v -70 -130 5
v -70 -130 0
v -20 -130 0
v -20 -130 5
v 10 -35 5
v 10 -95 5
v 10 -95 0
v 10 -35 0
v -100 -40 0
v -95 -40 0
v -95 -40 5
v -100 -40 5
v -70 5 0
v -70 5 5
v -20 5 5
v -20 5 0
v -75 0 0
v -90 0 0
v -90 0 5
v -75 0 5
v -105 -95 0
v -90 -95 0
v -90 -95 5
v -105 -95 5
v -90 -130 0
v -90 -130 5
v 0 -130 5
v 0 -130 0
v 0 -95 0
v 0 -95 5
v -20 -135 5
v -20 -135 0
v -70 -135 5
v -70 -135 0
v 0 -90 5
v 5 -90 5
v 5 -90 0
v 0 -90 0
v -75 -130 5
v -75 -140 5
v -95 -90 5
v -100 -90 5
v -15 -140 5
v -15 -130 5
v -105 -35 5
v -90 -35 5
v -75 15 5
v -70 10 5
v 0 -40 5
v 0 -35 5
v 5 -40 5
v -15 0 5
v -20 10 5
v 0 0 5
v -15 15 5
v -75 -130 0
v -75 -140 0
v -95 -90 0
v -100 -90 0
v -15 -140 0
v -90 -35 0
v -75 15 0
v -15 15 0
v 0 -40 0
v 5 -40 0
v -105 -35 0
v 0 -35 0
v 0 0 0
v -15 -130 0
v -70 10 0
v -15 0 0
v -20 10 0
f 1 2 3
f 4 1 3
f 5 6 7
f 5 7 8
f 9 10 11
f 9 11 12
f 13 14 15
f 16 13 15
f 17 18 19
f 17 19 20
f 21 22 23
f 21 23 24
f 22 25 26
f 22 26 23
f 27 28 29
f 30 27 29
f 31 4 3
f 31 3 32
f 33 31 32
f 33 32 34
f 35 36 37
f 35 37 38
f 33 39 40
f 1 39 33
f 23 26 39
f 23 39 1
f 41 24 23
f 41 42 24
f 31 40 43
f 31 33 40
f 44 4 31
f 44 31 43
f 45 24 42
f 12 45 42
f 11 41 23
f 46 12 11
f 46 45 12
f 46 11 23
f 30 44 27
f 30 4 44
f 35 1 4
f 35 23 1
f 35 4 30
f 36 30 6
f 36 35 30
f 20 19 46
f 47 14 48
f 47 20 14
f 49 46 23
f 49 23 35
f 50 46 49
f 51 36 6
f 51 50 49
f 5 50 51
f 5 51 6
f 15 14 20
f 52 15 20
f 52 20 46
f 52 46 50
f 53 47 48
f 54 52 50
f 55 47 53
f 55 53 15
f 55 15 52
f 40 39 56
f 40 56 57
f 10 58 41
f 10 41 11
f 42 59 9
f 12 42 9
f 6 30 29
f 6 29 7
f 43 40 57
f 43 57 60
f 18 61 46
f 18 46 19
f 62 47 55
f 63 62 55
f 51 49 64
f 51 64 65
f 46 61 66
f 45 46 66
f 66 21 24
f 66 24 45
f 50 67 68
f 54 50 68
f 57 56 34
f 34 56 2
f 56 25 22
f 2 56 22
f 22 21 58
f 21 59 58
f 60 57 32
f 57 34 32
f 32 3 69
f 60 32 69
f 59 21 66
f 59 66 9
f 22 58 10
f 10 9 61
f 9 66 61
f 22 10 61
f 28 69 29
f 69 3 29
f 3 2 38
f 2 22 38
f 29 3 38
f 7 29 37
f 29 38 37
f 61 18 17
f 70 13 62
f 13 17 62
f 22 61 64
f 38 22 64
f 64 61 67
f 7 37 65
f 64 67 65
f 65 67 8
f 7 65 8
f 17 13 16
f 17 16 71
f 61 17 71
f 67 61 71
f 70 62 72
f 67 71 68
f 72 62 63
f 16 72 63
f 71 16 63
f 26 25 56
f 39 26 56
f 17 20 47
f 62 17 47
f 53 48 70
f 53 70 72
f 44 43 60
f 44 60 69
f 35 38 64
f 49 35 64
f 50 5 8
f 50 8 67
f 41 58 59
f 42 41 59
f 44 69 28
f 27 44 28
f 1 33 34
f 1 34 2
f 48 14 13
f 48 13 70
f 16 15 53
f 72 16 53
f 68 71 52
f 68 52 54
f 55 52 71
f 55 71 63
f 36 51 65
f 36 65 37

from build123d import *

# Parameters (mm, degrees)
SKETCH1_W           = 90
SKETCH1_H           = 130
BOSS_EXTRUDE1_DEPTH = 5
SKETCH2_W           = 60
SKETCH2_H           = 15
SKETCH2_W_2         = 50
SKETCH2_H_2         = 5
BOSS_EXTRUDE2_DEPTH = 5
SKETCH3_W           = 50
SKETCH3_H           = 5
BOSS_EXTRUDE3_DEPTH = 5
SKETCH4_W           = 15
SKETCH4_H           = 60
SKETCH4_W_2         = 5
SKETCH4_H_2         = 50
BOSS_EXTRUDE4_DEPTH = 5


with BuildPart() as part:
    # Sketch1 → Boss-Extrude1 (new body)
    with BuildSketch(Plane.XY):
        with Locations((-45, -65)):
            Rectangle(SKETCH1_W, SKETCH1_H)
    extrude(amount=BOSS_EXTRUDE1_DEPTH)

    # Sketch2 → Boss-Extrude2 (add)
    # profile 1 of 2: a face of its own
    with BuildSketch(Plane.XY.offset(5)):
        with Locations((-45, 7.5)):
            Rectangle(SKETCH2_W, SKETCH2_H)
        with Locations((-45, 7.5)):
            Rectangle(SKETCH2_W_2, SKETCH2_H_2, mode=Mode.SUBTRACT)
    # profile 2 of 2: a face of its own
    with BuildSketch(Plane.XY.offset(5)):
        Polygon((-15, -140), (-15, -130), (-20, -130), (-20, -135), (-70, -135), (-70, -130), (-75, -130), (-75, -140), align=None)
    extrude(amount=-BOSS_EXTRUDE2_DEPTH)

    # Sketch3 → Boss-Extrude3 (add)
    # profile 1 of 2: a face of its own
    with BuildSketch(Plane.XY.offset(5)):
        Polygon((0, -130), (0, -95), (0, -90), (0, -40), (0, -35), (0, 0), (-15, 0), (-15, 15), (-75, 15), (-75, 0), (-90, 0), (-90, -130), (-75, -130), (-75, -140), (-15, -140), (-15, -130), align=None)
        with Locations((-45, -132.5)):
            Rectangle(SKETCH3_W, SKETCH3_H, mode=Mode.SUBTRACT)
        with Locations((-45, 7.5)):
            Rectangle(SKETCH3_W, SKETCH3_H, mode=Mode.SUBTRACT)
    # profile 2 of 2: a face of its own
    with BuildSketch(Plane.XY.offset(5)):
        Polygon((0, -95), (10, -95), (10, -35), (0, -35), (0, -40), (5, -40), (5, -90), (0, -90), align=None)
    extrude(amount=-BOSS_EXTRUDE3_DEPTH)

    # Sketch4 → Boss-Extrude4 (add)
    with BuildSketch(Plane(origin=(0, 0, 0), x_dir=(-1, 0, 0), z_dir=(0, 0, -1))):
        with Locations((97.5, -65)):
            Rectangle(SKETCH4_W, SKETCH4_H)
        with Locations((97.5, -65)):
            Rectangle(SKETCH4_W_2, SKETCH4_H_2, mode=Mode.SUBTRACT)
    extrude(amount=-BOSS_EXTRUDE4_DEPTH)


solid = part.part
